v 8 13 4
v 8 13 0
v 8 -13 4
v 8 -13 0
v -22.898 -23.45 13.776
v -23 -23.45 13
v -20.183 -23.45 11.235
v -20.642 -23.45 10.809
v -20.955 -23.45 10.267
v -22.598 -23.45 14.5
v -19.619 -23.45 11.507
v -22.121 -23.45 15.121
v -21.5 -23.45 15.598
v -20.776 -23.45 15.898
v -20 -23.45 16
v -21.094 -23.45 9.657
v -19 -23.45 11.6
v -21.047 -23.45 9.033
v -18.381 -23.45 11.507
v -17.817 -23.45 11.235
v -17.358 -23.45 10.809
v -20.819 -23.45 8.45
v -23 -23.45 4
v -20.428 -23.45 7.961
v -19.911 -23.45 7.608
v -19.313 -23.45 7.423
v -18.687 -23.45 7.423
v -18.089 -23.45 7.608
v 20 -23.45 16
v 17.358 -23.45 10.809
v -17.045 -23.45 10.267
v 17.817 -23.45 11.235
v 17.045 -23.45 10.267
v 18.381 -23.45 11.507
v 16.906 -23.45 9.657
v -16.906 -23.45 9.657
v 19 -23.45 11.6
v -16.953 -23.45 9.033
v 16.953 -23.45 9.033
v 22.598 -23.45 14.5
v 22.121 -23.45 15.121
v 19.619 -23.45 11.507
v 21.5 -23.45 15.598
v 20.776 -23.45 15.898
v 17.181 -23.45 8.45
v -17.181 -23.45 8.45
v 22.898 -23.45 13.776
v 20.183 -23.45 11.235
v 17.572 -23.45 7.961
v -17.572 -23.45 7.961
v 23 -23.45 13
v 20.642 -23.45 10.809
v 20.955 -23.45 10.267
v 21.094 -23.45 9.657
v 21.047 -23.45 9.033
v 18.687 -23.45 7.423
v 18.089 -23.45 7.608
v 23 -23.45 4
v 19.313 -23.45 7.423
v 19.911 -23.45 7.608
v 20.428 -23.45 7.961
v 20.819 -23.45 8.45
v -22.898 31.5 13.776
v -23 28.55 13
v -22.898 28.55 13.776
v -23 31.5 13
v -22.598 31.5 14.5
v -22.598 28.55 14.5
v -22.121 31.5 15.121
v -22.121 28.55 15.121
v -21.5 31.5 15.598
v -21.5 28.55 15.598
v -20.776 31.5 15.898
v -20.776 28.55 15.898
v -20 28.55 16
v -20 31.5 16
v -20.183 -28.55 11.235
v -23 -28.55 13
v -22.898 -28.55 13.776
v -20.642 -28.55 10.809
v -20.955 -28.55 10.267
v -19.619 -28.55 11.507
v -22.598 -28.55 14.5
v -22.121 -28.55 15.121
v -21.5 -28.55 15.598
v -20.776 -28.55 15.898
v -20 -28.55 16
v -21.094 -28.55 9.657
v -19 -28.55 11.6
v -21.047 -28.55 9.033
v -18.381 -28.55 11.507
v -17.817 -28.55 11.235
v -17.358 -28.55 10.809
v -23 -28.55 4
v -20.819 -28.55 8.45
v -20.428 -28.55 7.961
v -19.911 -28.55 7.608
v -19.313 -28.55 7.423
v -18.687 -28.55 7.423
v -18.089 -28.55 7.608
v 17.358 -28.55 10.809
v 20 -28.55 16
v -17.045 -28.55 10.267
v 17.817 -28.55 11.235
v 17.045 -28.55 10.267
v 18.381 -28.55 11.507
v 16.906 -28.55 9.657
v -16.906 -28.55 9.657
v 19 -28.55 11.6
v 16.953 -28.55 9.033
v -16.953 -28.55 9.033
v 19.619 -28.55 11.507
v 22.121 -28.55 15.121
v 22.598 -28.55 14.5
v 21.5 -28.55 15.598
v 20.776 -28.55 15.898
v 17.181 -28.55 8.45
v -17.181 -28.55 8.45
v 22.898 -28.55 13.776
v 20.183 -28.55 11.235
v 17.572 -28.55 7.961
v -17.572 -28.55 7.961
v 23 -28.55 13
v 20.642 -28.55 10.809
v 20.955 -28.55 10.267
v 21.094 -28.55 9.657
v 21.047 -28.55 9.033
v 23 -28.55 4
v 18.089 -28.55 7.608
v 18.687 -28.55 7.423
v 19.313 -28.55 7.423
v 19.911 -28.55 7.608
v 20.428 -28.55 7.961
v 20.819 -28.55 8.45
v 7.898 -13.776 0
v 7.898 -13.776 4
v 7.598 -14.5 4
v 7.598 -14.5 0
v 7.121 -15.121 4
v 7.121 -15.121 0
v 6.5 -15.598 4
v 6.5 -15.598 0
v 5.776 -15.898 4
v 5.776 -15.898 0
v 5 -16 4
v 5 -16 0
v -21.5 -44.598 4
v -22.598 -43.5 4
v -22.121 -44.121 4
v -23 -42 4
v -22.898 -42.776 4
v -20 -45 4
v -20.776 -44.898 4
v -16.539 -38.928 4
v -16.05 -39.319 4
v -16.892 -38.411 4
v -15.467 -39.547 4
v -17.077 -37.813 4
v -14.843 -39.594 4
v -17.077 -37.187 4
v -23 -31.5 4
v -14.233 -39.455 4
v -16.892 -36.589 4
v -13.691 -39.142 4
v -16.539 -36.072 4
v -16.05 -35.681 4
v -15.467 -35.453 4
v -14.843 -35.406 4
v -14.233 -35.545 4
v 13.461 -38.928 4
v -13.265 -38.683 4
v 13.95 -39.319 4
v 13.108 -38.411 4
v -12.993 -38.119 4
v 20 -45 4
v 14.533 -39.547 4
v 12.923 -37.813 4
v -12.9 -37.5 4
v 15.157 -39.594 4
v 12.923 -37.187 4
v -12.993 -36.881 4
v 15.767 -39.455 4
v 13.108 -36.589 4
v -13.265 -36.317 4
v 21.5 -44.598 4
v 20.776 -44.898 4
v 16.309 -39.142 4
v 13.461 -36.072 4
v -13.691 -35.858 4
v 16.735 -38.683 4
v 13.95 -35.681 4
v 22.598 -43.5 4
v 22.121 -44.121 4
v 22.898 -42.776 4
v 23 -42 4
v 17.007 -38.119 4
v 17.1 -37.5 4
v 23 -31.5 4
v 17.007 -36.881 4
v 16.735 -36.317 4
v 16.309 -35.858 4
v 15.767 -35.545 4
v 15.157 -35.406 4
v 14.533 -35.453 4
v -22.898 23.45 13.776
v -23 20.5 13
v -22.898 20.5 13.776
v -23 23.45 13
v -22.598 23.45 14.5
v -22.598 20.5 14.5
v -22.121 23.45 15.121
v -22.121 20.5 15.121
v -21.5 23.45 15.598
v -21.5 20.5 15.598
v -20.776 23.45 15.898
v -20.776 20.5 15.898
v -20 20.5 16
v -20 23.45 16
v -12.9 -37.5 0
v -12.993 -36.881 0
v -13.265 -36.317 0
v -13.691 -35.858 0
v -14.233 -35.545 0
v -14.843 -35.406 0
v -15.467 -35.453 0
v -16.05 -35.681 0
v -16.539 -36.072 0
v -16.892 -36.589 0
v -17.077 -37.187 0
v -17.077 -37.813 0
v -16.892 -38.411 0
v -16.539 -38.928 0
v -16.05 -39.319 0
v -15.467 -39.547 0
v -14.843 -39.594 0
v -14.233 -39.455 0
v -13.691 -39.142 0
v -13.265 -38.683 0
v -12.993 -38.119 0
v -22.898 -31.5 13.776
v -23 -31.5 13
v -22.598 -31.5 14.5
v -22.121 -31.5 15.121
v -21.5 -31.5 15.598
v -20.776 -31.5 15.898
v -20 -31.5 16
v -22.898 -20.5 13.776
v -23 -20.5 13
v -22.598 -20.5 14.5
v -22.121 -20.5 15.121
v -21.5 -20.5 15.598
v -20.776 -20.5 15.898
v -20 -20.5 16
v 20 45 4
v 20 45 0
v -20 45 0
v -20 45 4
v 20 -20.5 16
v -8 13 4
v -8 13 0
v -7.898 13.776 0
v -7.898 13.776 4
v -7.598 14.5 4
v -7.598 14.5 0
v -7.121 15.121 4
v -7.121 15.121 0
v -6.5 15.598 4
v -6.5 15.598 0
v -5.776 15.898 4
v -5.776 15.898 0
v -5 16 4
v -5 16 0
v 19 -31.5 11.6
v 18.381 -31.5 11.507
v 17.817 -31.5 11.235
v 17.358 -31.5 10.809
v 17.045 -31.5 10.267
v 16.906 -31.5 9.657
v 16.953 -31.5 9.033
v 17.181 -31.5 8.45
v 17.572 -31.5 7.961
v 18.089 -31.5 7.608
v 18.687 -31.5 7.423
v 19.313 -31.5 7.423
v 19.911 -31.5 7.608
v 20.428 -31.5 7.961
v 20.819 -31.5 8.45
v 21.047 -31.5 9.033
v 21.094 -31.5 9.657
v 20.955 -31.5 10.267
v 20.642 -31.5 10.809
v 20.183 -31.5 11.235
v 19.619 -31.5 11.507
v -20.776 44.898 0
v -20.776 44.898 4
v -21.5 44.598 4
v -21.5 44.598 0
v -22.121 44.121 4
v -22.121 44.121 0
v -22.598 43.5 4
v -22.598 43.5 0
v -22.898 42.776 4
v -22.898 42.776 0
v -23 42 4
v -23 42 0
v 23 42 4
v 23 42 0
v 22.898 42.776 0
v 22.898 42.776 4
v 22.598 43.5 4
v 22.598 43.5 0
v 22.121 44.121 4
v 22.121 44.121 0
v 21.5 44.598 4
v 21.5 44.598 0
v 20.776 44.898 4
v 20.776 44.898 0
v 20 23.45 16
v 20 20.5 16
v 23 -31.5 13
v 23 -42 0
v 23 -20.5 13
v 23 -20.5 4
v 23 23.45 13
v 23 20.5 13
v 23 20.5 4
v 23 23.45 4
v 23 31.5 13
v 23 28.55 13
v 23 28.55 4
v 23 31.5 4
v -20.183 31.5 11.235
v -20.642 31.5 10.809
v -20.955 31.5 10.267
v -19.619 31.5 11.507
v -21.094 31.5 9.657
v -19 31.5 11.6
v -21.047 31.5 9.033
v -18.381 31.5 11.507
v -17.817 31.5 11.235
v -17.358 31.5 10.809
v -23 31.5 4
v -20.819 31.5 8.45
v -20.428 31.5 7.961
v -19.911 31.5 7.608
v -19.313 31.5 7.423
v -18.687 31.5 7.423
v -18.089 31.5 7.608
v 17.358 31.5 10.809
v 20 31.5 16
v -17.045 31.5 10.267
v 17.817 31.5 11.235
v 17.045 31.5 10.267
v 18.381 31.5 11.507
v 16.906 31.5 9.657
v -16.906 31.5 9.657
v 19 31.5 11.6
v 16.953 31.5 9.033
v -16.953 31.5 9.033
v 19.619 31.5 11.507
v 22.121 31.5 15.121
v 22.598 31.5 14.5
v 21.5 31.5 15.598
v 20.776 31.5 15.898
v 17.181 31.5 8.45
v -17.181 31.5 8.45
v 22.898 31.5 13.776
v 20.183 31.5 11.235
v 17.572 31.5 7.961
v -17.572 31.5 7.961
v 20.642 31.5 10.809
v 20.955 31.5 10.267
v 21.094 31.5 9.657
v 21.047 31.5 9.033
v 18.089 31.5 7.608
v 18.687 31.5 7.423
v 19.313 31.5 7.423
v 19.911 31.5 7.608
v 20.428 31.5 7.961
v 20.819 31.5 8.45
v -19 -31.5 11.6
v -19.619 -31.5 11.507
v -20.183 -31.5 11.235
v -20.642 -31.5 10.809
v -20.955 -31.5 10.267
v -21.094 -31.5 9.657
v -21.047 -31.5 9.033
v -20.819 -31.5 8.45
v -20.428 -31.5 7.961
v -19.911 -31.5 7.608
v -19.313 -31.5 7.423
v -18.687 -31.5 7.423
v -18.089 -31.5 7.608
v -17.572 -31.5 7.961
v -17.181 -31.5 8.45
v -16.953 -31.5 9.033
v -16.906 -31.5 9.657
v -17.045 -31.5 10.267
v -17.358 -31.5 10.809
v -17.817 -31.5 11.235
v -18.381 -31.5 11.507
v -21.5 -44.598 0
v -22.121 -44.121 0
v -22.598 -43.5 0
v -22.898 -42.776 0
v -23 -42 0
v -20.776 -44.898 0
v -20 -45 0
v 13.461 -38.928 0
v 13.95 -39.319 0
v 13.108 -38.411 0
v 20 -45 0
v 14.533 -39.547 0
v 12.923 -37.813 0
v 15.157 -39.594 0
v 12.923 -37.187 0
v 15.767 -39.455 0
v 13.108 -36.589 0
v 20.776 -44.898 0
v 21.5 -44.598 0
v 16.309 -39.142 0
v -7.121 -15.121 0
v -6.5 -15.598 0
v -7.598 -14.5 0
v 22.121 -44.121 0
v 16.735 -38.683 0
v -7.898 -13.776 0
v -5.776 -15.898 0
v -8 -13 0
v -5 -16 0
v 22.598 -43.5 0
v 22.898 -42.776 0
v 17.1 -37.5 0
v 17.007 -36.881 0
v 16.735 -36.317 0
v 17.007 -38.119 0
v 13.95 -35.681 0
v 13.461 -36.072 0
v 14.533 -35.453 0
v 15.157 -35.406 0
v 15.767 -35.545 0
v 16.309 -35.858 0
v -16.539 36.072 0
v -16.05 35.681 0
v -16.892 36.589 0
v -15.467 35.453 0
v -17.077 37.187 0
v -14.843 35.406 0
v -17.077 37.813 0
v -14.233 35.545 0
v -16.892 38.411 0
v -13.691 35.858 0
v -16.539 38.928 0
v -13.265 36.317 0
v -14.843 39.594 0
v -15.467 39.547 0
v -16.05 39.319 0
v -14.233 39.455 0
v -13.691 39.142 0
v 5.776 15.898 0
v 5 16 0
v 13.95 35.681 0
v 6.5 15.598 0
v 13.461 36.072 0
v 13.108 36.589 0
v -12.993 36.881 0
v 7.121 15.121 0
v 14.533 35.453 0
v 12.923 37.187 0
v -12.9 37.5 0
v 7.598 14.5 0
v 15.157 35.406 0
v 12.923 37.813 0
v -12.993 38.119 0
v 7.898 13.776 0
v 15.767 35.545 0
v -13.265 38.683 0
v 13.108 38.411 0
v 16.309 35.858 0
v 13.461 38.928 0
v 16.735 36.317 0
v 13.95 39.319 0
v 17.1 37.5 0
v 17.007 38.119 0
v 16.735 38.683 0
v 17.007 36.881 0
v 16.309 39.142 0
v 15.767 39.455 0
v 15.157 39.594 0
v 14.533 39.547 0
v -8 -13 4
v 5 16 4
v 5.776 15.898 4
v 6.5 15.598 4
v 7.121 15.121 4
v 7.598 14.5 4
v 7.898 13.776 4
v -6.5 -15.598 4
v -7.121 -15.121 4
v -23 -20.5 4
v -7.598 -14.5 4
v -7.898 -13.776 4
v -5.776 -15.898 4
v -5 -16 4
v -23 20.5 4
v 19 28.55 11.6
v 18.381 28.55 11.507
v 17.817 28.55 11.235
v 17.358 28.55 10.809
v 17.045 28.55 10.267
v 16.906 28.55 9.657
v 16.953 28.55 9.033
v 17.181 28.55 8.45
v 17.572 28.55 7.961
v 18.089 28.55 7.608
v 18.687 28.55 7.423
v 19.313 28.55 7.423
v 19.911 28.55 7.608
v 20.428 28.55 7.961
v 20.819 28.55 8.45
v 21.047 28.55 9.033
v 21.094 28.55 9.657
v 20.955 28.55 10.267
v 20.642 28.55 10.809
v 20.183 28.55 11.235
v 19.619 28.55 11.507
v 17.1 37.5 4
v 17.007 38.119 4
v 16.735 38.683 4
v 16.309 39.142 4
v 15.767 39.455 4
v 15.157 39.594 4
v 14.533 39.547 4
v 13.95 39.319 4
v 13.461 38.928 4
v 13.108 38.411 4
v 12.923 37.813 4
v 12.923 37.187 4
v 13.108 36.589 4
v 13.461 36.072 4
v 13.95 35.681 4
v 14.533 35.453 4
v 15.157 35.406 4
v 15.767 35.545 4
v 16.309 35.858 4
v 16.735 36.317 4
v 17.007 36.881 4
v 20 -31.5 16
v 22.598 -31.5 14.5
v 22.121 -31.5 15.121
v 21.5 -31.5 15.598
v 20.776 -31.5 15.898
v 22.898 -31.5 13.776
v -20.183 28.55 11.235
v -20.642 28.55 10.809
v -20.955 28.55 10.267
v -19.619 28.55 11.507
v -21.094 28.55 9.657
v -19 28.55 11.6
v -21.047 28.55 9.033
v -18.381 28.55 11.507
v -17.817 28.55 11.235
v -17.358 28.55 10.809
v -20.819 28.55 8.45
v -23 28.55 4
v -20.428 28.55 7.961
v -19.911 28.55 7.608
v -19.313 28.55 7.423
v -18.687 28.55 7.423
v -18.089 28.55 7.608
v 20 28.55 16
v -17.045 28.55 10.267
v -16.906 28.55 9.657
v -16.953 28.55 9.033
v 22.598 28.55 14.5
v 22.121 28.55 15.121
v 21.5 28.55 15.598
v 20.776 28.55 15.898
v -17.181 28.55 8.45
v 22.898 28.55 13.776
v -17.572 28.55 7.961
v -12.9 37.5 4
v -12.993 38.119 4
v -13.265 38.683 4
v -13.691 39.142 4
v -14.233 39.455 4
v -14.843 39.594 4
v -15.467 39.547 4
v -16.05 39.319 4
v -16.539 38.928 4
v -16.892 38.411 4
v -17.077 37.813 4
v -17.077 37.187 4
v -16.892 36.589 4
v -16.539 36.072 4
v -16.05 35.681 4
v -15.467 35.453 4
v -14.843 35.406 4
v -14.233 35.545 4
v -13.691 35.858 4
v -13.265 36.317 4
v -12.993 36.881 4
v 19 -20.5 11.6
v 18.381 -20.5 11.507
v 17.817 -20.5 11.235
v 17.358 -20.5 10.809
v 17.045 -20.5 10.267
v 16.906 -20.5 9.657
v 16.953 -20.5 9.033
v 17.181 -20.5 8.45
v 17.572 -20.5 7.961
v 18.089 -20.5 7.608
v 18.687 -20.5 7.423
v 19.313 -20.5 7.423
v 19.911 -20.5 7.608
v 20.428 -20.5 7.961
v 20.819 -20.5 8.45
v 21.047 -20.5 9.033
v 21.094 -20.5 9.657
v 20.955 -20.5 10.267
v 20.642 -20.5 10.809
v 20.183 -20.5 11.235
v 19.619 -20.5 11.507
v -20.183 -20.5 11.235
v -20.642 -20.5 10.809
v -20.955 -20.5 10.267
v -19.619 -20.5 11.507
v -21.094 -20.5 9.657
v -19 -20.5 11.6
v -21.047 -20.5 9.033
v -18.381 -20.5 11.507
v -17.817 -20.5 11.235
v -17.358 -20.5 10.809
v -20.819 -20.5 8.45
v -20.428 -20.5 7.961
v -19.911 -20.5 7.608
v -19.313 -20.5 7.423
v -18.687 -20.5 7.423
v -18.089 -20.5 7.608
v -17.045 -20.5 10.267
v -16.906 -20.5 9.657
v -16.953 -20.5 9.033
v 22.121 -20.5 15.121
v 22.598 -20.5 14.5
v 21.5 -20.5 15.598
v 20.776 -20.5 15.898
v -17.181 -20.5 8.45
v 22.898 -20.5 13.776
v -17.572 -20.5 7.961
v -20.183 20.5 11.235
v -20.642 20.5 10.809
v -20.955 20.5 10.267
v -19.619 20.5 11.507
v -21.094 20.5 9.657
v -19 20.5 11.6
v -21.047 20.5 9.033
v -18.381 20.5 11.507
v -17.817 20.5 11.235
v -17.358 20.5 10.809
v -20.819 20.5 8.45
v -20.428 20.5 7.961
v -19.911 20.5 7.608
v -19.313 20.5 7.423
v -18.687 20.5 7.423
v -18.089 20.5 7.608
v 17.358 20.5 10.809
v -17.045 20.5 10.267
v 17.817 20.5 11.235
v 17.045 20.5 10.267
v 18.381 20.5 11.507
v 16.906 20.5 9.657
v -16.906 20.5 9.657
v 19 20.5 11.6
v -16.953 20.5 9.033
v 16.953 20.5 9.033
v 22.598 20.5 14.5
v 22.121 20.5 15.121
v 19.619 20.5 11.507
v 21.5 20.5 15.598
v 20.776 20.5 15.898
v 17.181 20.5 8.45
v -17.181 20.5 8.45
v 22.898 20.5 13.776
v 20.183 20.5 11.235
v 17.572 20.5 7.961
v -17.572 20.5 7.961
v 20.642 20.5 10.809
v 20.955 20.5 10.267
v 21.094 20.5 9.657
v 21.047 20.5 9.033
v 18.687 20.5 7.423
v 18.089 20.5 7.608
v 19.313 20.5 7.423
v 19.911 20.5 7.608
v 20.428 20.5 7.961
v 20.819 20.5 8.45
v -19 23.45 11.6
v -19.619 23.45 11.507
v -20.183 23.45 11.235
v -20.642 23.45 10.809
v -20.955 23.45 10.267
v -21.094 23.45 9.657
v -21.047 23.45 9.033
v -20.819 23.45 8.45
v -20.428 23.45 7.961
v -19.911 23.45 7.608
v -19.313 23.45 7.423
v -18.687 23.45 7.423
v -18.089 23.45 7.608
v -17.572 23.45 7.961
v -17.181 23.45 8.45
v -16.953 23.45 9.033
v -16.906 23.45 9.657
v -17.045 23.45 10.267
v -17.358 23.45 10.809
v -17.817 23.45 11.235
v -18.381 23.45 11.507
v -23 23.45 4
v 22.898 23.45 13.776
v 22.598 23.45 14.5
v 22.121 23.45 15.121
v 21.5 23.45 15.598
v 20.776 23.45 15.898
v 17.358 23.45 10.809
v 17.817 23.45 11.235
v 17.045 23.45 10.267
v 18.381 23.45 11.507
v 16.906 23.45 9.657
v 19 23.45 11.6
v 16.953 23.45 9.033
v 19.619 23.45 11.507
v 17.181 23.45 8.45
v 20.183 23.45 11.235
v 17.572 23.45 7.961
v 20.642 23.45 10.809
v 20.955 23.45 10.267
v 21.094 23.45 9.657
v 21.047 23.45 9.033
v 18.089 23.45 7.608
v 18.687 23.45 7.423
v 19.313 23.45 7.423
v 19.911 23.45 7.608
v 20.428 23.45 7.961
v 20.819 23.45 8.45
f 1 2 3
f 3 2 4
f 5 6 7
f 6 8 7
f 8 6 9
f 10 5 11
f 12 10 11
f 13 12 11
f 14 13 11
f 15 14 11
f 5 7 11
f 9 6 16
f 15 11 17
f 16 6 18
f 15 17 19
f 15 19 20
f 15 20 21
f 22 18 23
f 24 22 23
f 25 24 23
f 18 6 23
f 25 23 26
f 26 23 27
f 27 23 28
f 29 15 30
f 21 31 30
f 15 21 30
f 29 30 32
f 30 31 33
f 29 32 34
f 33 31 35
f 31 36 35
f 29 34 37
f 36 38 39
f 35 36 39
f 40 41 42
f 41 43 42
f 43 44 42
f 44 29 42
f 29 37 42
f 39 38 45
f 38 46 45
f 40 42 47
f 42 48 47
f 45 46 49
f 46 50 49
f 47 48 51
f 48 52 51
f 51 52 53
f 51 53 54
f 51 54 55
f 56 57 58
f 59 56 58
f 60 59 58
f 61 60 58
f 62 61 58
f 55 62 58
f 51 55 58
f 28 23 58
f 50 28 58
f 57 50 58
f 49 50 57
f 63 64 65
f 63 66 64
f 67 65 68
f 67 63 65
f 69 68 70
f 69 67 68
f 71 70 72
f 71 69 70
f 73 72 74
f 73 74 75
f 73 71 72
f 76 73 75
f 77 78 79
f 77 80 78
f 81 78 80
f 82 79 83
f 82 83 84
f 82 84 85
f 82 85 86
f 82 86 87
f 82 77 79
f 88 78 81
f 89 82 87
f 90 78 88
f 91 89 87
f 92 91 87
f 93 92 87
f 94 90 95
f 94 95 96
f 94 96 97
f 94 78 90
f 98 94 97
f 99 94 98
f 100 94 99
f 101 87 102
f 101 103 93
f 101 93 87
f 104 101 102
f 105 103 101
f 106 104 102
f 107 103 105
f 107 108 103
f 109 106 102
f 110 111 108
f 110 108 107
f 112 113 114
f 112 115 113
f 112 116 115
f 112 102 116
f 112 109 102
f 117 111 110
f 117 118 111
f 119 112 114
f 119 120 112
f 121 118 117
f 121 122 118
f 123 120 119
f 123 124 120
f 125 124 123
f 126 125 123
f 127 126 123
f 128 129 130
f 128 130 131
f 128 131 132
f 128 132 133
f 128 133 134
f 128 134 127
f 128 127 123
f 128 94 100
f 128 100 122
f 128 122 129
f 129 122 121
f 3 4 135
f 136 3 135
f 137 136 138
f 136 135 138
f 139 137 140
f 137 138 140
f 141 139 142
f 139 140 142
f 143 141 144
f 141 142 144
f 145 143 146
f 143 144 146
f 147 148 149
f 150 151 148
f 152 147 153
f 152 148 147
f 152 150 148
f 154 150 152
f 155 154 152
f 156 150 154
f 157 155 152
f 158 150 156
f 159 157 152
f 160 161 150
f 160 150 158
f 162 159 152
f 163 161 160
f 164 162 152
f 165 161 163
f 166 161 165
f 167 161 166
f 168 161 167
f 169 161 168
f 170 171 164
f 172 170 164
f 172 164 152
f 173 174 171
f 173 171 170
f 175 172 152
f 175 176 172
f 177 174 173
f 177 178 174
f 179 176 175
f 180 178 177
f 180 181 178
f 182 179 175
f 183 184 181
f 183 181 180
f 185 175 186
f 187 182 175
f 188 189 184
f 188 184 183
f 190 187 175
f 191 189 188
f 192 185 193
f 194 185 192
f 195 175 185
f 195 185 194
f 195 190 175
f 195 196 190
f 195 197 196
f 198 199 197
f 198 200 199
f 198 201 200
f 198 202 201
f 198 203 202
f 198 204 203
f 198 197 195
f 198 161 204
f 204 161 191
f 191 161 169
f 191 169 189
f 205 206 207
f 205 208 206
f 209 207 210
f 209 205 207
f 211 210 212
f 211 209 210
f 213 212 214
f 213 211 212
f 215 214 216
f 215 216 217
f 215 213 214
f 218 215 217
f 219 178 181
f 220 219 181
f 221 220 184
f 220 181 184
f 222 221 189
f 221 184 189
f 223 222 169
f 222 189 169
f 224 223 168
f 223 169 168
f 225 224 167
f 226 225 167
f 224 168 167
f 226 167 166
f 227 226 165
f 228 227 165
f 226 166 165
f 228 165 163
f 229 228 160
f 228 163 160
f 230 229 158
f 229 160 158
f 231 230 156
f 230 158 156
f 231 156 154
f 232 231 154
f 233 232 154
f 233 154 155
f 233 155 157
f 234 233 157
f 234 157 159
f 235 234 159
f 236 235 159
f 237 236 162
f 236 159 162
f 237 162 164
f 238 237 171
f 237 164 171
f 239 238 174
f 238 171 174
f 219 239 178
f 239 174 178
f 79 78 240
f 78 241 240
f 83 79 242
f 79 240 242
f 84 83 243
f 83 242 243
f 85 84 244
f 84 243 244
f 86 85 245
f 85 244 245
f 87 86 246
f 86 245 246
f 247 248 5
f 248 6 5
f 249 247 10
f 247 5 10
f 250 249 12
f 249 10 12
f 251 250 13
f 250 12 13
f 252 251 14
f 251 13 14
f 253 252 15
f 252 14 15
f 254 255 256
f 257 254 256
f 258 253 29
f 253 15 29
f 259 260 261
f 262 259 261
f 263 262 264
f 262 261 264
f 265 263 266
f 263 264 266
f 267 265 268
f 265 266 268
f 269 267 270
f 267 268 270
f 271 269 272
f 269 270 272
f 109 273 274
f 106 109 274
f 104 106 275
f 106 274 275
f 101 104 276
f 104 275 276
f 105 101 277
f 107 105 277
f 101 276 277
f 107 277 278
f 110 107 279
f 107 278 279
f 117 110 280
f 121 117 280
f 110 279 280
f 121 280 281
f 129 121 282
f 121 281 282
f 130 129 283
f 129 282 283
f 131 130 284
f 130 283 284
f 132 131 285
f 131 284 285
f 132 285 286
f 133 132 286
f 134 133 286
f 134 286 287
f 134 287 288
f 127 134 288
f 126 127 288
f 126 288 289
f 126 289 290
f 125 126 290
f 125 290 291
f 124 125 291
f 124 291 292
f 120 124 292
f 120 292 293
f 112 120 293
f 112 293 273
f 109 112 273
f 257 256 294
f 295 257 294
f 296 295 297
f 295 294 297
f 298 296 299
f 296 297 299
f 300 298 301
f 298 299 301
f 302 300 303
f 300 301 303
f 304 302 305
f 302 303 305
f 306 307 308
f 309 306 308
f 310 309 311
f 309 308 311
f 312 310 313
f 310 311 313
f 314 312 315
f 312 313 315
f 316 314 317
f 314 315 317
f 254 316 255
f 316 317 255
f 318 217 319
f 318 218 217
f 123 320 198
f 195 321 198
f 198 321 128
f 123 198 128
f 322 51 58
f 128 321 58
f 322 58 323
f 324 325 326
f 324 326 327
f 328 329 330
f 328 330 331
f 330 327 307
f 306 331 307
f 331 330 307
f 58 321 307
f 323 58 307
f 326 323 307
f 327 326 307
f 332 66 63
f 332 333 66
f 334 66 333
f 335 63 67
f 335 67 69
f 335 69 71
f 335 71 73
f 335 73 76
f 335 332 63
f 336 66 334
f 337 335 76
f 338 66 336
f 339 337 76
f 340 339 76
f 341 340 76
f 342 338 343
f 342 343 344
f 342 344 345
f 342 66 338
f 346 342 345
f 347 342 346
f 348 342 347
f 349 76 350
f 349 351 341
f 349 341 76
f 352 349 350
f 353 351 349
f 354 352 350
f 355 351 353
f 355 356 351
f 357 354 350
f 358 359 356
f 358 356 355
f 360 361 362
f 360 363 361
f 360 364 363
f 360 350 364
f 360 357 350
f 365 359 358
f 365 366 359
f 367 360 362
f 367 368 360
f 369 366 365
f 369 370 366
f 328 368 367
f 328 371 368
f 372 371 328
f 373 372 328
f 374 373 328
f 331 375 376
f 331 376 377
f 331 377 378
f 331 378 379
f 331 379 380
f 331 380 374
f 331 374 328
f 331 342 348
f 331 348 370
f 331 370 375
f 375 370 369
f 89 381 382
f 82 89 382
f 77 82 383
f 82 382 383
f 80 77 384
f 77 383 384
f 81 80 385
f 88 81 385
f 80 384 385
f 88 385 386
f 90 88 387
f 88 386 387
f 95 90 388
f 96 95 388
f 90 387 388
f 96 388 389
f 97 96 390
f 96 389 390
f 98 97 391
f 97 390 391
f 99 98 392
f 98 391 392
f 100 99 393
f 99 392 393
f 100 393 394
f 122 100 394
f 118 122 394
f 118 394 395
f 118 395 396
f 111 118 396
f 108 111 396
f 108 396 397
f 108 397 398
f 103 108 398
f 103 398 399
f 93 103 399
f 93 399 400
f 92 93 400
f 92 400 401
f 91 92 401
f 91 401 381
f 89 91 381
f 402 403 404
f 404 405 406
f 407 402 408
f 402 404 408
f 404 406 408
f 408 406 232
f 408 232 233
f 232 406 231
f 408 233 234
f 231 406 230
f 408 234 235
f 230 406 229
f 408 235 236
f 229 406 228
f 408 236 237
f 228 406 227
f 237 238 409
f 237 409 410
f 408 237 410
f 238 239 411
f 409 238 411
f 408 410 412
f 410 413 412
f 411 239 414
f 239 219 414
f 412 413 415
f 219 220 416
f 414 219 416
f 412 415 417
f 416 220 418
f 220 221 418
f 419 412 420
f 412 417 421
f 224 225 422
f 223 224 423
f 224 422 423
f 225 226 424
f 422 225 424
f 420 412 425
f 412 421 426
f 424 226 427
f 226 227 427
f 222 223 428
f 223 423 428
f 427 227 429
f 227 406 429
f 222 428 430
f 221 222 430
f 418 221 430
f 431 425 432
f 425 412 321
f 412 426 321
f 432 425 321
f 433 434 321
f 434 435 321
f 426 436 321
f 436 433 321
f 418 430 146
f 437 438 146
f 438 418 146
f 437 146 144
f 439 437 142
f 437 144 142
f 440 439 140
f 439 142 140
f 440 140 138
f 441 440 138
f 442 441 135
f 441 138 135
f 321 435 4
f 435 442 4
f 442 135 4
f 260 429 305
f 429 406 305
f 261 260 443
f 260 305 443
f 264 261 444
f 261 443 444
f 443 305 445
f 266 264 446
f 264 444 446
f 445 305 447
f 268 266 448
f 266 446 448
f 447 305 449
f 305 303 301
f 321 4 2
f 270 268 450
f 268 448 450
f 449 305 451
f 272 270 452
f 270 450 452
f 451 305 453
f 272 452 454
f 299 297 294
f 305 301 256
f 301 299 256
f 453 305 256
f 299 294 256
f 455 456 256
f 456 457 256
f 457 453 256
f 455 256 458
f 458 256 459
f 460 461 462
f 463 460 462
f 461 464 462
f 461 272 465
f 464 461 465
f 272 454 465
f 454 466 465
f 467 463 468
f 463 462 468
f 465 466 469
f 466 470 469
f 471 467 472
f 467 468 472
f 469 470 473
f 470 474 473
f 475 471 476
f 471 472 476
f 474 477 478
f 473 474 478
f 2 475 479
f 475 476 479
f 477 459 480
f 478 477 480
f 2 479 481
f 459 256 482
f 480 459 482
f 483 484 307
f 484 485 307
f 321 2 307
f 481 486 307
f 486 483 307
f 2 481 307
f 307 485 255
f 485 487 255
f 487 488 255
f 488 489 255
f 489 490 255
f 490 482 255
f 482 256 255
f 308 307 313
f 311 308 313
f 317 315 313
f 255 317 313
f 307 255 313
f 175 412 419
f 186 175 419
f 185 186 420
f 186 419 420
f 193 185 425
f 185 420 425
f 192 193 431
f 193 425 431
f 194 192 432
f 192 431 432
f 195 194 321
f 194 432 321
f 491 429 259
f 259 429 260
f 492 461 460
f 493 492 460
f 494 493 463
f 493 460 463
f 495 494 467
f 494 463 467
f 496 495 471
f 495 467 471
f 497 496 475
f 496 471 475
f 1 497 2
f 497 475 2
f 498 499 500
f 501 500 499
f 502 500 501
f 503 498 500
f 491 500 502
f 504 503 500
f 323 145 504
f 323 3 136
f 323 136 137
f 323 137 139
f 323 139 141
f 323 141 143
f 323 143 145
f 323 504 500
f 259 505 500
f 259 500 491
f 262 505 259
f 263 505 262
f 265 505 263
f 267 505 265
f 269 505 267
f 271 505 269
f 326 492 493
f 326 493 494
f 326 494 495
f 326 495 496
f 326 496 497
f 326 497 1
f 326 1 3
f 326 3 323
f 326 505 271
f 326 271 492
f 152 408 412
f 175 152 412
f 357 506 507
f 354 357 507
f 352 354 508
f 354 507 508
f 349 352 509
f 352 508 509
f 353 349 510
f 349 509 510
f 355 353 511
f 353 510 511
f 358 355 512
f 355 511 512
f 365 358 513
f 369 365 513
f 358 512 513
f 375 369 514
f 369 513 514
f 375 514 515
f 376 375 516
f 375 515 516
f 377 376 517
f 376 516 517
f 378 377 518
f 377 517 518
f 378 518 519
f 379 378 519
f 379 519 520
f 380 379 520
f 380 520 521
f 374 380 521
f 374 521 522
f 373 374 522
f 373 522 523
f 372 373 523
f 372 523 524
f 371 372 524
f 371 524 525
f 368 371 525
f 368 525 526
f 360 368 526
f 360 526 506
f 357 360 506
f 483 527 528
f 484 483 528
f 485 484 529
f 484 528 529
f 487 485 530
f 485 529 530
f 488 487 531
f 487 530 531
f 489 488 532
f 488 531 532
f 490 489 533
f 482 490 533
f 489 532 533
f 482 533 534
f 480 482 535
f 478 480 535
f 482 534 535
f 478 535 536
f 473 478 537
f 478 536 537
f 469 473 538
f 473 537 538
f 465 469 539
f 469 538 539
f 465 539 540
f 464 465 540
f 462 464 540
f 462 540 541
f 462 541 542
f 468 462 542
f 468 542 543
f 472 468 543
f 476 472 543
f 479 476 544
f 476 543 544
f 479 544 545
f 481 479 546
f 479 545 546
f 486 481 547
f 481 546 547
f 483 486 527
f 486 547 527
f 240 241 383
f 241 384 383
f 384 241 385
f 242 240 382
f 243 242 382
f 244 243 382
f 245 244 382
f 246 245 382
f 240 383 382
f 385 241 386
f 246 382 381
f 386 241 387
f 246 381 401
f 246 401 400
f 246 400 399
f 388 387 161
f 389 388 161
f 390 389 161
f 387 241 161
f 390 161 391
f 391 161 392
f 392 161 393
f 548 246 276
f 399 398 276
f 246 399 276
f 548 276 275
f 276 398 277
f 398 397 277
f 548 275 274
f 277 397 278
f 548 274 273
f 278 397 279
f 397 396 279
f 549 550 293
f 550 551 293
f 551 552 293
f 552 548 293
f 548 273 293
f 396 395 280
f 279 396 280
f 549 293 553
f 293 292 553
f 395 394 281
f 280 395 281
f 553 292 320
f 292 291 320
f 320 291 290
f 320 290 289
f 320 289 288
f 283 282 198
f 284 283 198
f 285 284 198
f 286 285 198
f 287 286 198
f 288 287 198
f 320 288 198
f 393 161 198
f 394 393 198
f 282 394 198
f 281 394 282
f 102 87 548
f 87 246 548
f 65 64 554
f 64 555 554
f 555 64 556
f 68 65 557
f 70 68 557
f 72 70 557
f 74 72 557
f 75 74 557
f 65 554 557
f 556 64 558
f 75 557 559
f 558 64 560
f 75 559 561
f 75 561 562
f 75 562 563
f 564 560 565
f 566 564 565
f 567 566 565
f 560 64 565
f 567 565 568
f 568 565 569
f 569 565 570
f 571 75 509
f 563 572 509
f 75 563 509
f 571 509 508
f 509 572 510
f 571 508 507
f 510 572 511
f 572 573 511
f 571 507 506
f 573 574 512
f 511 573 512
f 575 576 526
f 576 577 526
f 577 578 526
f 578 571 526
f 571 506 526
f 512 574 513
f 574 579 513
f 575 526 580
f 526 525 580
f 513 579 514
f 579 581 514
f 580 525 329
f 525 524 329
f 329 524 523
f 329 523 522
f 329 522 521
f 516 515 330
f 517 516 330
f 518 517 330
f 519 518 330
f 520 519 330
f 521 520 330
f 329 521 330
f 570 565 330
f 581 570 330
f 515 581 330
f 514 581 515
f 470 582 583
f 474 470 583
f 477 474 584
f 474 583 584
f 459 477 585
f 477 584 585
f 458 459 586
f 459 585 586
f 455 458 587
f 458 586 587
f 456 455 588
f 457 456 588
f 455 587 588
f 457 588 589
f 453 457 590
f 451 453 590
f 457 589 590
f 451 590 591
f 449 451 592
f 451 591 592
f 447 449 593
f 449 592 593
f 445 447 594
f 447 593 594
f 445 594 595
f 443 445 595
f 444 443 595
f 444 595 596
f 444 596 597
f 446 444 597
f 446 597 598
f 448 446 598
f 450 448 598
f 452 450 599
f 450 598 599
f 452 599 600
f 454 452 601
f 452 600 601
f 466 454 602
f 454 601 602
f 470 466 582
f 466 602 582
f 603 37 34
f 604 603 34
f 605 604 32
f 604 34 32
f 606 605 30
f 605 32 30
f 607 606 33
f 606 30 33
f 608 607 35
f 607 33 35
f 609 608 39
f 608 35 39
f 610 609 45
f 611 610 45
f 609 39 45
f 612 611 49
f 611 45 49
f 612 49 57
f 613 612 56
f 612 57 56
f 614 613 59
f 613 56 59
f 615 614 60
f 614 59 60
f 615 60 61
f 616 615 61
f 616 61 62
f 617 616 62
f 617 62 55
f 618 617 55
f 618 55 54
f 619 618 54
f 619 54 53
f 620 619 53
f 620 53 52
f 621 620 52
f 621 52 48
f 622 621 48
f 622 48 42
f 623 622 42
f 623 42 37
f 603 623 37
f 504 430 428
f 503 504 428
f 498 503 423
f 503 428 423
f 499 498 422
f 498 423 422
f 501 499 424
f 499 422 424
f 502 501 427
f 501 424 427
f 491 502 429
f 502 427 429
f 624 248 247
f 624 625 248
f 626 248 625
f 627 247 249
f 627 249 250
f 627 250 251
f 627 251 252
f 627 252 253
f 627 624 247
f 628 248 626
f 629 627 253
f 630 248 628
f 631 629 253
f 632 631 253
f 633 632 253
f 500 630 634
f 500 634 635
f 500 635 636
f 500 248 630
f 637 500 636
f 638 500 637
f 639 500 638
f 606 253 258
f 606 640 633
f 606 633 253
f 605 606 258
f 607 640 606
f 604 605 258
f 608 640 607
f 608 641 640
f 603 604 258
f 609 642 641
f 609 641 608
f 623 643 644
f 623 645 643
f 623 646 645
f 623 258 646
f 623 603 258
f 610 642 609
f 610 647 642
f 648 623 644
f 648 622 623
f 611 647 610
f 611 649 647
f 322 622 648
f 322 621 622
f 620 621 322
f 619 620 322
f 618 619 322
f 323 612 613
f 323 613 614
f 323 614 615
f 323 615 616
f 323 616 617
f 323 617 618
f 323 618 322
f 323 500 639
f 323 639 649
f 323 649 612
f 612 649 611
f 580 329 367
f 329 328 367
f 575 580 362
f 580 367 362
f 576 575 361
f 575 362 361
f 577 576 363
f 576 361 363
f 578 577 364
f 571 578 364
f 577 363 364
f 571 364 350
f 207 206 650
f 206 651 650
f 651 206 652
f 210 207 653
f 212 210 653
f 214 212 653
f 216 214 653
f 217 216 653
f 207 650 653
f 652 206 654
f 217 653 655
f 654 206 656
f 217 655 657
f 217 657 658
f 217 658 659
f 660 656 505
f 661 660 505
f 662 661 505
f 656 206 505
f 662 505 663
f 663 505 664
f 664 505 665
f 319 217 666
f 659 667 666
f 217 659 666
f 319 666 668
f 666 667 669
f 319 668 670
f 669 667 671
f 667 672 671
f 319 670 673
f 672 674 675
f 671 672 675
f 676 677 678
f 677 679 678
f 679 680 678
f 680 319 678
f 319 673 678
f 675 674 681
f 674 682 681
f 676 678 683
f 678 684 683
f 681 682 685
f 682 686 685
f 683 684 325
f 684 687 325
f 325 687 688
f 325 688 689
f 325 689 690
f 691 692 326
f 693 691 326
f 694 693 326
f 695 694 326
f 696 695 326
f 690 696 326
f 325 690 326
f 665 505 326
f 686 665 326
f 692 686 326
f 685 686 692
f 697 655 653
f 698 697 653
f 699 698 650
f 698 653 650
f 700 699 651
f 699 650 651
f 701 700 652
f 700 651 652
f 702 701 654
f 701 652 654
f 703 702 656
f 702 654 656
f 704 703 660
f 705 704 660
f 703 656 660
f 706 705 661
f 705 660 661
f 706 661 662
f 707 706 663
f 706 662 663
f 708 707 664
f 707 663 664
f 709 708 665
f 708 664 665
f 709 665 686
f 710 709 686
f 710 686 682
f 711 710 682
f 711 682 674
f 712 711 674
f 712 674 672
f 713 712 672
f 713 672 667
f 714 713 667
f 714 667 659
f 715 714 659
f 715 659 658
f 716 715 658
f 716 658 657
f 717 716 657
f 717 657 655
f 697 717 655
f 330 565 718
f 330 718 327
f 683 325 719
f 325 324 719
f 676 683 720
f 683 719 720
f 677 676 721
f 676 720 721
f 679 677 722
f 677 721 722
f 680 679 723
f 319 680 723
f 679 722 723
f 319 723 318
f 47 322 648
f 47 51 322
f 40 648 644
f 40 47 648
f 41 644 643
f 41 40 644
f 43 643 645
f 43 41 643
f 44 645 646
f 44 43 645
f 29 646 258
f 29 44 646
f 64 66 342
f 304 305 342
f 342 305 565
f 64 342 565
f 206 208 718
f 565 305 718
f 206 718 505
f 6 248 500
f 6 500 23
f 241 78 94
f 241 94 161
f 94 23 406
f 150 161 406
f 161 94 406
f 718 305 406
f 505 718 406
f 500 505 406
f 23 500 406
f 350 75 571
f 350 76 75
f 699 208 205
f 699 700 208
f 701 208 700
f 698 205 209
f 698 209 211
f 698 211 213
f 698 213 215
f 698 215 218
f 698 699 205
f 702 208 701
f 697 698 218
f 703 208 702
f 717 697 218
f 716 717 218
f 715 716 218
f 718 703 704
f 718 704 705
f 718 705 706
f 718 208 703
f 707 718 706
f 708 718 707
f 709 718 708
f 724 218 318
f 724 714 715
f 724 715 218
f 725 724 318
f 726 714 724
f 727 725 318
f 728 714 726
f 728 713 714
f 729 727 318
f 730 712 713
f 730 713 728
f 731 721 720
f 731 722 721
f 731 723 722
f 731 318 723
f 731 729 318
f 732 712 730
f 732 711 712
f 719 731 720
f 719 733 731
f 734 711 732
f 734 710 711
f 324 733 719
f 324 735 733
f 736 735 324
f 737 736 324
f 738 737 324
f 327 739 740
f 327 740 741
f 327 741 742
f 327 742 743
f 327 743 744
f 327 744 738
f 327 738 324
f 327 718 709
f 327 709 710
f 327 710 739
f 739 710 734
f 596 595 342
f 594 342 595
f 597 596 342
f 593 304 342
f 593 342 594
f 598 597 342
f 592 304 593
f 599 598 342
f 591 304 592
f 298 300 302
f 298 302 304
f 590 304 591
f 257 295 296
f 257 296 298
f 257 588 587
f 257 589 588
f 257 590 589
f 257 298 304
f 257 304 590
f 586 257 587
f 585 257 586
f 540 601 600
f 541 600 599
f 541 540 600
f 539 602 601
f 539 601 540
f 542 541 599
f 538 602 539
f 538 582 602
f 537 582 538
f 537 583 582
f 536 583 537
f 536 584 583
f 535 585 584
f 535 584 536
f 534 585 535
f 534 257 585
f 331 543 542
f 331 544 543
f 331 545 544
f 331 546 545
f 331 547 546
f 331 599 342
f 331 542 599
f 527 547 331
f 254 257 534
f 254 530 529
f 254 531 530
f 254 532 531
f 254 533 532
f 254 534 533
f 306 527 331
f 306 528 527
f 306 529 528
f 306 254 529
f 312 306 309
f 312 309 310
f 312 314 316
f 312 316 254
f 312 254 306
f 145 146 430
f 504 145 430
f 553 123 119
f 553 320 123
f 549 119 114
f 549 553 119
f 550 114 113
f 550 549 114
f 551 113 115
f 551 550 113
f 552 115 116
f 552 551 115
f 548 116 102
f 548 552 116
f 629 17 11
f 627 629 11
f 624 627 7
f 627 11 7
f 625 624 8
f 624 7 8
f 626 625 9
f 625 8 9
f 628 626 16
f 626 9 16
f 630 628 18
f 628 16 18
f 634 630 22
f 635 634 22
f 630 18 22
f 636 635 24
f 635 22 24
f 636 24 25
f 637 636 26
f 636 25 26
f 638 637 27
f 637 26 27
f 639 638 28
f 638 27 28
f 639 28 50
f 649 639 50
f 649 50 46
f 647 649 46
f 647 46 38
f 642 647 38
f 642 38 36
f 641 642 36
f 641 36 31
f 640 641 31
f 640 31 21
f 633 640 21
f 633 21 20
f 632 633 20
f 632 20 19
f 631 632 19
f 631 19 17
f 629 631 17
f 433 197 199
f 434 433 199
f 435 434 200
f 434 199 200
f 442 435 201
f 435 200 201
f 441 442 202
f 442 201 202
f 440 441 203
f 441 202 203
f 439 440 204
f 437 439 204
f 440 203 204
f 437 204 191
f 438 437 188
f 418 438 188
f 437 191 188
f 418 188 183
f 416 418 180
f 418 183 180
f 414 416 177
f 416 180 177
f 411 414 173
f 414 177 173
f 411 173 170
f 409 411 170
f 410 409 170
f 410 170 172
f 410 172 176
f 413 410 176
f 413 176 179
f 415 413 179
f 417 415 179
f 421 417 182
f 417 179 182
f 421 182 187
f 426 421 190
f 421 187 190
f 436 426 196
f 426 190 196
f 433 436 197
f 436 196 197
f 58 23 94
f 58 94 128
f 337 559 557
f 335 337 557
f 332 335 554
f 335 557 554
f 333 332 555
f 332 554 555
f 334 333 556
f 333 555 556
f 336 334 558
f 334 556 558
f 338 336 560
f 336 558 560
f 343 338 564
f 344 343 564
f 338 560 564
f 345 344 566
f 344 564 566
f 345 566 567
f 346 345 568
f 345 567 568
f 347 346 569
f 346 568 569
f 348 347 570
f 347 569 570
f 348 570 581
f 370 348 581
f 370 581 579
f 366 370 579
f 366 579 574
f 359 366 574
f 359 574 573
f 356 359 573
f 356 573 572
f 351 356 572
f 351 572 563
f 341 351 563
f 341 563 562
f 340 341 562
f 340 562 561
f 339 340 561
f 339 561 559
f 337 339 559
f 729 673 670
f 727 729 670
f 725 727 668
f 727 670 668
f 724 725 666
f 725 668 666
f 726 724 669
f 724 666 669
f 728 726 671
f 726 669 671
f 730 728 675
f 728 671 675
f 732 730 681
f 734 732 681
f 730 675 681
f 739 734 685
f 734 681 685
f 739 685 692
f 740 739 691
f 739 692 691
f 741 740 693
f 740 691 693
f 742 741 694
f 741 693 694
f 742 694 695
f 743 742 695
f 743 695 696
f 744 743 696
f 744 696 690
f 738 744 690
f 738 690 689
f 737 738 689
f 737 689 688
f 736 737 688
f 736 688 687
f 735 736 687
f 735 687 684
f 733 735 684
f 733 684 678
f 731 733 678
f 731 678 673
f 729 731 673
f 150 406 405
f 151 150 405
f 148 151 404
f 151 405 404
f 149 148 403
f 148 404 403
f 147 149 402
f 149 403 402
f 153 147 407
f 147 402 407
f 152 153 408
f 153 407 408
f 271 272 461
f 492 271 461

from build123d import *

# Parameters (mm, degrees)
EXTRUDE_1_DEPTH     = 4
SKETCH_2_R          = 2.1
CUT_EXTRUDE_1_DEPTH = 4
SKETCH_3_W          = 46
SKETCH_3_H          = 2.95
EXTRUDE_2_DEPTH     = 12
FILLET_1_R          = 3
SKETCH_4_R          = 2.1
CUT_EXTRUDE_2_DEPTH = 82.469319379
CUT_EXTRUDE_3_DEPTH = 10


with BuildPart() as part:
    # 草图1 → 凸台-拉伸1 (new body)
    with BuildSketch(Plane.XY):
        with BuildLine():
            Line((-20, -45), (20, -45))
            ThreePointArc((20, -45), (22.121320344, -44.121320344), (23, -42))
            Line((23, -42), (23, 42))
            ThreePointArc((23, 42), (22.121320344, 44.121320344), (20, 45))
            Line((20, 45), (-20, 45))
            ThreePointArc((-20, 45), (-22.121320344, 44.121320344), (-23, 42))
            Line((-23, 42), (-23, -42))
            ThreePointArc((-23, -42), (-22.121320344, -44.121320344), (-20, -45))
        make_face()
    extrude(amount=EXTRUDE_1_DEPTH)

    # 草图2 → 切除-拉伸1 (cut)
    with BuildSketch(Plane.XY.offset(4)):
        with Locations((15, -37.5)):
            Circle(SKETCH_2_R)
        with Locations((-15, -37.5)):
            Circle(SKETCH_2_R)
        with Locations((-15, 37.5)):
            Circle(SKETCH_2_R)
        with Locations((15, 37.5)):
            Circle(SKETCH_2_R)
    extrude(amount=-CUT_EXTRUDE_1_DEPTH, mode=Mode.SUBTRACT)

    # 草图3 → 凸台-拉伸2 (add)
    with BuildSketch(Plane.XY.offset(4)):
        with Locations((0, 30.025)):
            Rectangle(SKETCH_3_W, SKETCH_3_H)
        with Locations((0, 21.975)):
            Rectangle(SKETCH_3_W, SKETCH_3_H)
    extrude_2 = extrude(amount=EXTRUDE_2_DEPTH)

    # 镜向1: 凸台-拉伸2 across plane
    add(extrude_2.mirror(Plane.ZX))

    # 圆角1
    fillet_1_edges = [part.edges().sort_by_distance(p)[0] for p in [
        (-23, 30.025, 16),
        (23, 30.025, 16),
        (-23, 21.975, 16),
        (23, 21.975, 16),
        (-23, -30.025, 16),
        (23, -30.025, 16),
        (23, -21.975, 16),
        (-23, -21.975, 16),
    ]]
    fillet(fillet_1_edges, radius=FILLET_1_R)

    # 草图4 → 切除-拉伸2 (cut, through all)
    with BuildSketch(Plane.XZ.offset(31.5)):
        with Locations(Location((19, 9.5, 0), (0, 0, 90))):
            Circle(SKETCH_4_R)
        with Locations(Location((-19, 9.5, 0), (0, 0, 90))):
            Circle(SKETCH_4_R)
    extrude(amount=-CUT_EXTRUDE_2_DEPTH, mode=Mode.SUBTRACT)

    # 草图5 → 切除-拉伸3 (cut)
    with BuildSketch(Plane(origin=(0, 0, 0), x_dir=(-1, 0, 0), z_dir=(0, 0, -1))):
        with BuildLine():
            Line((-5, -16), (5, -16))
            ThreePointArc((5, -16), (7.121320344, -15.121320344), (8, -13))
            Line((8, -13), (8, 13))
            ThreePointArc((8, 13), (7.121320344, 15.121320344), (5, 16))
            Line((5, 16), (-5, 16))
            ThreePointArc((-5, 16), (-7.121320344, 15.121320344), (-8, 13))
            Line((-8, 13), (-8, -13))
            ThreePointArc((-8, -13), (-7.121320344, -15.121320344), (-5, -16))
        make_face()
    extrude(amount=-CUT_EXTRUDE_3_DEPTH, mode=Mode.SUBTRACT)


solid = part.part
